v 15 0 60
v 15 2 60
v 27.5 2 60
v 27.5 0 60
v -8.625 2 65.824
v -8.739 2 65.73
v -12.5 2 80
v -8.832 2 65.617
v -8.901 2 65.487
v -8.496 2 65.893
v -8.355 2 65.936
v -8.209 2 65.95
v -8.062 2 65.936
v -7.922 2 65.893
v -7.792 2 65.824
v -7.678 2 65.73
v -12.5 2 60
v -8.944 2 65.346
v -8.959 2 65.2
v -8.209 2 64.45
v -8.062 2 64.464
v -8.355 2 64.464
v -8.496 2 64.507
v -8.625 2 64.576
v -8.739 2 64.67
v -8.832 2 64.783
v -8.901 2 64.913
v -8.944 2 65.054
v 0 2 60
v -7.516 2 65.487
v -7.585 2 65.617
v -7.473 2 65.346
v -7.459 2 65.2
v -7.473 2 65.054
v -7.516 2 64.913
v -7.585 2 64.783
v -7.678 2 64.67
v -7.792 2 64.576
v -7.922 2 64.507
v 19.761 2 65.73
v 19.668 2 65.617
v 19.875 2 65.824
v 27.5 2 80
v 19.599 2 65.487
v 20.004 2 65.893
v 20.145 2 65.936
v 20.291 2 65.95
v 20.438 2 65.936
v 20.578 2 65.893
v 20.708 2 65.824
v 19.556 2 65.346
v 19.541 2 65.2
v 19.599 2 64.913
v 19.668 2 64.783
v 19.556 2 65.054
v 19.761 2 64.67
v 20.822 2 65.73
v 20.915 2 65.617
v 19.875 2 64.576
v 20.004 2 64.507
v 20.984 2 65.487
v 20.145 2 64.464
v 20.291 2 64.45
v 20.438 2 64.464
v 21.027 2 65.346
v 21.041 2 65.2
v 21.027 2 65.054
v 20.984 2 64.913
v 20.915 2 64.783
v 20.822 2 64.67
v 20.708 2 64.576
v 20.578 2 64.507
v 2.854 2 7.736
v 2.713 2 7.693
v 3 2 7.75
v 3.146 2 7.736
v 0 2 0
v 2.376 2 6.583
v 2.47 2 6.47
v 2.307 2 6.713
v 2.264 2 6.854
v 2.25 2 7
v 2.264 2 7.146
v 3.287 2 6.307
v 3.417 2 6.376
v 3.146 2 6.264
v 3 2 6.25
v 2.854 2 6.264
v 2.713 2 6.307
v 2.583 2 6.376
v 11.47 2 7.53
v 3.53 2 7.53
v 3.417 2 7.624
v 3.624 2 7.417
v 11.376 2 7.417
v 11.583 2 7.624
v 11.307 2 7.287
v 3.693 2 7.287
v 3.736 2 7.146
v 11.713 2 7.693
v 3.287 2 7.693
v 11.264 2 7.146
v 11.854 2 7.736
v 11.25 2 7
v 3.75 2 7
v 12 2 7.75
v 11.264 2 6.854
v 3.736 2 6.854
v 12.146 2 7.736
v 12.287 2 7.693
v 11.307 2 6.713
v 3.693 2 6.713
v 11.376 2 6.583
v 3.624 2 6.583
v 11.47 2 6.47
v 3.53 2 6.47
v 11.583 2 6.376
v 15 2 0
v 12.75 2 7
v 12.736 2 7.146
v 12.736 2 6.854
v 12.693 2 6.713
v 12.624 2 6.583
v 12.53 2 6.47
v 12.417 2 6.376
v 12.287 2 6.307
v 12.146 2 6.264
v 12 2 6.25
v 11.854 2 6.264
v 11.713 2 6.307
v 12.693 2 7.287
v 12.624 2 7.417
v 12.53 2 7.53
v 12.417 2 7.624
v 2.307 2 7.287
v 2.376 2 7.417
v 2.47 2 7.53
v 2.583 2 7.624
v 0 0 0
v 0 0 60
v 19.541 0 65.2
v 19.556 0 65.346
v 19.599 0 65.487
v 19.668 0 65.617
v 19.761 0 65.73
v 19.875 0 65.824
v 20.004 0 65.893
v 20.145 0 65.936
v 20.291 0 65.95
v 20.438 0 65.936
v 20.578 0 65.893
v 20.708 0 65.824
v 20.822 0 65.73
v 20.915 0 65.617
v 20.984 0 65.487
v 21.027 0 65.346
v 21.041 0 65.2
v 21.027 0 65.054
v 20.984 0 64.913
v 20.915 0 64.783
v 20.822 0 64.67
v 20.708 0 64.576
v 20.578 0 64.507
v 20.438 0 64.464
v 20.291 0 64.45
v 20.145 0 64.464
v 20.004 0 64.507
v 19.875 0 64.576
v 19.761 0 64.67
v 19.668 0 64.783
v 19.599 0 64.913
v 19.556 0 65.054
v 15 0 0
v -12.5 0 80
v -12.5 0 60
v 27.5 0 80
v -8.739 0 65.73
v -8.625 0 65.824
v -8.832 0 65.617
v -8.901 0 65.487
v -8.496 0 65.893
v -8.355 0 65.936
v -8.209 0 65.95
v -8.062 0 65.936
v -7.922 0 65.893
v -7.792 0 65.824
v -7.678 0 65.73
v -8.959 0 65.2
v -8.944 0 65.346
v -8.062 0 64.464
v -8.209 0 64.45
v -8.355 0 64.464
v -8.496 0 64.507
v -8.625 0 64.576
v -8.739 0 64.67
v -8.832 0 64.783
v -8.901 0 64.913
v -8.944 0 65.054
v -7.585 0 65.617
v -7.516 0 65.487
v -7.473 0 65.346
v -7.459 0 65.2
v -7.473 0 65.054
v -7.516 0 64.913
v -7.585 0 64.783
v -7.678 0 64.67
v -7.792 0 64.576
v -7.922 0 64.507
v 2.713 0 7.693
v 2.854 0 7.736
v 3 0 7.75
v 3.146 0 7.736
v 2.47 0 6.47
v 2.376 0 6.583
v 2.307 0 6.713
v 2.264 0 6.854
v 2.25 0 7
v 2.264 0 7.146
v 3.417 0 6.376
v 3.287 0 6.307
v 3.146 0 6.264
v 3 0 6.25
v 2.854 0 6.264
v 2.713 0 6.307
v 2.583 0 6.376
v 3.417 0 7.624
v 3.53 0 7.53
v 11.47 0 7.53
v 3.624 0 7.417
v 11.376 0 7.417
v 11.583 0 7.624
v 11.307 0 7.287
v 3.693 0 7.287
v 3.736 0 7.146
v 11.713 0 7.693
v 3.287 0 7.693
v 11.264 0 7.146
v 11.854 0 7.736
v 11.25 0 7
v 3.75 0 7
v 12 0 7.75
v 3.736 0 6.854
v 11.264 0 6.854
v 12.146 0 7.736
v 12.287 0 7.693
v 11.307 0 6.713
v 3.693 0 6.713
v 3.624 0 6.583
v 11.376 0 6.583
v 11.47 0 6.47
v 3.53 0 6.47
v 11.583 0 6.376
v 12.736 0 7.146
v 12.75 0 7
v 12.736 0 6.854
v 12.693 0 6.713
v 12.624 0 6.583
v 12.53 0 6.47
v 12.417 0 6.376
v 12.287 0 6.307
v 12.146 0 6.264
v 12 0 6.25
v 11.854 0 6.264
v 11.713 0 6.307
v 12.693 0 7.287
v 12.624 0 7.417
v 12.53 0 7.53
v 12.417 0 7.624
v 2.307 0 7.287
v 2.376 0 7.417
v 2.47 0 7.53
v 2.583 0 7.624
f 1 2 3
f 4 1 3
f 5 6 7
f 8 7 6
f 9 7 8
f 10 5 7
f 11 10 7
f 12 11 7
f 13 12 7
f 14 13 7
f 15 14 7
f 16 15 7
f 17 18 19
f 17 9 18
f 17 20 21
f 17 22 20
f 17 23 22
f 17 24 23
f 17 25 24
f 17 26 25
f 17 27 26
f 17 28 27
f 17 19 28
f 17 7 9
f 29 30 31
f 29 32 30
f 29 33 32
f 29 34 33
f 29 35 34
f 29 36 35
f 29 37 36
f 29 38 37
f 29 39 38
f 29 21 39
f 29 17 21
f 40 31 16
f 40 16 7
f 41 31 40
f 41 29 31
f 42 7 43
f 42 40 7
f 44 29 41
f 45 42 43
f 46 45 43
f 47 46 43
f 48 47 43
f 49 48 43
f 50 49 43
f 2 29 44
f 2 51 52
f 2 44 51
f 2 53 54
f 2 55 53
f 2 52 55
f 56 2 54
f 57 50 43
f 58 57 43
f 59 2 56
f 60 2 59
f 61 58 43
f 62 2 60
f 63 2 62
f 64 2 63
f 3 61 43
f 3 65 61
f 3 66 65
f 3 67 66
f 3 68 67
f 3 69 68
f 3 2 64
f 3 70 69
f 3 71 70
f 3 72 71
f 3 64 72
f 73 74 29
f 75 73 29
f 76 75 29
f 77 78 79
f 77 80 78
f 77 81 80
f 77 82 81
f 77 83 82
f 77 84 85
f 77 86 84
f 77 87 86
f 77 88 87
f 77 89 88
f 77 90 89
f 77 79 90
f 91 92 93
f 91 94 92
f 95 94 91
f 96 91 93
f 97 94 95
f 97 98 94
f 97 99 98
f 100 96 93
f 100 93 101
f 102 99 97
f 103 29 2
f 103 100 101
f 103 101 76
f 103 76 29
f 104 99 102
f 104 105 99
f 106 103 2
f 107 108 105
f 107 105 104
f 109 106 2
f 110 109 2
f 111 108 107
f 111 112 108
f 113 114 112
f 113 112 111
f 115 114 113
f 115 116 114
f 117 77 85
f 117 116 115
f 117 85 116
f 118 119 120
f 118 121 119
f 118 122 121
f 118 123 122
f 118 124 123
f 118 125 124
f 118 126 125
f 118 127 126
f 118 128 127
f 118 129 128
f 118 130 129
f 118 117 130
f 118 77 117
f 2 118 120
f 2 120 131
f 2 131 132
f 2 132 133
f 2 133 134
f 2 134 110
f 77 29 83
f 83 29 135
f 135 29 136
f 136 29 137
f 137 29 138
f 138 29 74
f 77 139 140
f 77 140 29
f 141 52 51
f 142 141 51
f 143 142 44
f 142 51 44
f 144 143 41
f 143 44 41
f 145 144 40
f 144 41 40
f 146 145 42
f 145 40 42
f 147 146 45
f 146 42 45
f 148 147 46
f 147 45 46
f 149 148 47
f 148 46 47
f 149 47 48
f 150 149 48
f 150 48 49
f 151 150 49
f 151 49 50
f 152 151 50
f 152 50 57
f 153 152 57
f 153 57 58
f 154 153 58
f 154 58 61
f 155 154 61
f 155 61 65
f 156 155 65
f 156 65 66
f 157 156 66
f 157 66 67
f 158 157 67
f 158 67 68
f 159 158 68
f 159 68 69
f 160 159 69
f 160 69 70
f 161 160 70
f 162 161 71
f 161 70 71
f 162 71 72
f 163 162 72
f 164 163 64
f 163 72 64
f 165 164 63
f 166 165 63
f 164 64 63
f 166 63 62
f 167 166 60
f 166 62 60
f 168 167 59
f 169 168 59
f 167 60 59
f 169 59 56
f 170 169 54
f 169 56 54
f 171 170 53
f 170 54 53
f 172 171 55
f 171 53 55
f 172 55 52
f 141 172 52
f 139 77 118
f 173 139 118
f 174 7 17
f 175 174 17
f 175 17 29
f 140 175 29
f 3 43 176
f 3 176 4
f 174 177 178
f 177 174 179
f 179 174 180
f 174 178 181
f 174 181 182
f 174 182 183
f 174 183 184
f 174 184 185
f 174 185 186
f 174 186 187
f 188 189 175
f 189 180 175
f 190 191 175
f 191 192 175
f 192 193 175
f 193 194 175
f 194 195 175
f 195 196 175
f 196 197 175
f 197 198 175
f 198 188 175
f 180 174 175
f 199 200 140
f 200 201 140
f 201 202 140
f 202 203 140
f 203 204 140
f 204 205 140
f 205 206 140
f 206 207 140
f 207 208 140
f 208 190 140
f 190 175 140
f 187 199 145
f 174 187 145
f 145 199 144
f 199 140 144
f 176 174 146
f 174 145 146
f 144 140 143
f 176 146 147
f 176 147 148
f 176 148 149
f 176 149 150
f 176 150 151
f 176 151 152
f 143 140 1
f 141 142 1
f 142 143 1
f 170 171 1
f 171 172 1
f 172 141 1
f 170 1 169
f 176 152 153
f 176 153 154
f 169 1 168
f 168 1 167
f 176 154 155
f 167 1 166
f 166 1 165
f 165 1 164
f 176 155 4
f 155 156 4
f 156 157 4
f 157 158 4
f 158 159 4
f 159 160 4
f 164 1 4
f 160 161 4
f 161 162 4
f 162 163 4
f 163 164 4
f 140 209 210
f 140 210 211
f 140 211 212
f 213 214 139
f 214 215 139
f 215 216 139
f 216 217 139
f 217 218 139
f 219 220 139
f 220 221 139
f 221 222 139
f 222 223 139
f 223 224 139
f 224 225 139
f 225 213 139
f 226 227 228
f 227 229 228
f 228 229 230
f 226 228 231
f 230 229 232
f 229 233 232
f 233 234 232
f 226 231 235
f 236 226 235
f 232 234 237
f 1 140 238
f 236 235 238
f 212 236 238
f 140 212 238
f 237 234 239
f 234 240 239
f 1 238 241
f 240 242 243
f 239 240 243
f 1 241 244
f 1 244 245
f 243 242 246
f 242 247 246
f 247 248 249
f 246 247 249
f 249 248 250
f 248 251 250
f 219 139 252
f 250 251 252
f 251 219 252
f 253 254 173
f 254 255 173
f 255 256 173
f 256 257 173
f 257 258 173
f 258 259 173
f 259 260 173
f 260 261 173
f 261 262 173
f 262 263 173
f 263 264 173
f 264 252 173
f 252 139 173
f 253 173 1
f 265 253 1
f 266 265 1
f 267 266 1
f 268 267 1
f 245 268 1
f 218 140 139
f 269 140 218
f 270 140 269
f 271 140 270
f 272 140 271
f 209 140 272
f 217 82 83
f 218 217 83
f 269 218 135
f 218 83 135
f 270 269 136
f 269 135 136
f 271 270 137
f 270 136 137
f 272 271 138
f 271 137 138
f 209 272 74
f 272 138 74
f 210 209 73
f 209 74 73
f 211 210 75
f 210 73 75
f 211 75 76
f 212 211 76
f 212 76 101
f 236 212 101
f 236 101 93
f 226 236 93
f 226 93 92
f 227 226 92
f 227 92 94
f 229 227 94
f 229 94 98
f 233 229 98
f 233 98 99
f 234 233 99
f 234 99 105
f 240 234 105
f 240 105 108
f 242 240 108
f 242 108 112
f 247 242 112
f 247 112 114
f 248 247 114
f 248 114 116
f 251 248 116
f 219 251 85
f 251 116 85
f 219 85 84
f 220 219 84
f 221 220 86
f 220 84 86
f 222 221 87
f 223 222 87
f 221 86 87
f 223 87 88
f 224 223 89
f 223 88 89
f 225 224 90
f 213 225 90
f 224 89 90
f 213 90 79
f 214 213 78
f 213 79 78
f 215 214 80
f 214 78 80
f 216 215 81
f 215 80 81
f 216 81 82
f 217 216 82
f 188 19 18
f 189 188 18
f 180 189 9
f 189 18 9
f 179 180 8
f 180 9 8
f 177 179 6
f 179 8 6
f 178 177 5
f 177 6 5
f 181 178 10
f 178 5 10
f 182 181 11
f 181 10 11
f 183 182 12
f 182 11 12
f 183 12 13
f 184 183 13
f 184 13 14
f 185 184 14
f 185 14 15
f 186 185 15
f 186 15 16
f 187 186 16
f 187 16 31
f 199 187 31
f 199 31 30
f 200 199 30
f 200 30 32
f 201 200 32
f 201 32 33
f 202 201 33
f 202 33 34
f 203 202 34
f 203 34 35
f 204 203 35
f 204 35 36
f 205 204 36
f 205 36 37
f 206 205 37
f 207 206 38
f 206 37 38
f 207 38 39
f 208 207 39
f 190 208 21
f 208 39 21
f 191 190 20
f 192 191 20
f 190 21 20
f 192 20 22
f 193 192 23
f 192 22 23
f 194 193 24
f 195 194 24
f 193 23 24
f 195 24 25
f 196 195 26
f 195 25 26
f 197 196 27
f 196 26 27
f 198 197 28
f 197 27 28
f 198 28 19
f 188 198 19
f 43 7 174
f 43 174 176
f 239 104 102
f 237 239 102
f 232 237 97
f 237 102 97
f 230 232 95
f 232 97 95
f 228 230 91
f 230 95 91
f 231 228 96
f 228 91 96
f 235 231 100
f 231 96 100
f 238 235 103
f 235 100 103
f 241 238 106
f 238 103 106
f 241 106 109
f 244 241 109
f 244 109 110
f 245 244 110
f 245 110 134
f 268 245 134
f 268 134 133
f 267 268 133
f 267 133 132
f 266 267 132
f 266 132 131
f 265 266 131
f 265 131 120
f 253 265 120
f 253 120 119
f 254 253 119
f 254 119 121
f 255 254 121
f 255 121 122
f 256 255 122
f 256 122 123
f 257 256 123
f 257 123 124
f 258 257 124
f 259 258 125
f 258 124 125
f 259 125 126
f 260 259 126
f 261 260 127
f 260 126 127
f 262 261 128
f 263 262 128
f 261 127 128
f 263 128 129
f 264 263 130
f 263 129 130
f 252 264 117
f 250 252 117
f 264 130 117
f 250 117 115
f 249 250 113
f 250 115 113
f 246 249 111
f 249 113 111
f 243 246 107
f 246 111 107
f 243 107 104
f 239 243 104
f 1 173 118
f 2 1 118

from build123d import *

# Parameters (mm, degrees)
SKETCH1_W           = 15
SKETCH1_H           = 2
BOSS_EXTRUDE1_DEPTH = 80
SKETCH2_W           = 40
SKETCH2_H           = 20
BOSS_EXTRUDE2_DEPTH = 2
SKETCH3_R           = 0.75
CUT_EXTRUDE1_DEPTH  = 85.618260441


with BuildPart() as part:
    # Sketch1 → Boss-Extrude1 (new body)
    with BuildSketch(Plane.XY):
        with Locations((7.5, 1)):
            Rectangle(SKETCH1_W, SKETCH1_H)
    extrude(amount=BOSS_EXTRUDE1_DEPTH)

    # Sketch2 → Boss-Extrude2 (add)
    with BuildSketch(Plane(origin=(0, 2, 0), x_dir=(1, 0, 0), z_dir=(0, 1, 0))):
        with Locations((7.5, -70)):
            Rectangle(SKETCH2_W, SKETCH2_H)
    extrude(amount=-BOSS_EXTRUDE2_DEPTH)

    # Sketch3 → Cut-Extrude1 (cut, through all)
    with BuildSketch(Plane(origin=(0, 2, 0), x_dir=(1, 0, 0), z_dir=(0, 1, 0))):
        with Locations(Location((20.291432582, -65.2, 0), (0, 0, 180))):
            Circle(SKETCH3_R)
        with Locations(Location((-8.208567418, -65.2, 0), (0, 0, 180))):
            Circle(SKETCH3_R)
        with Locations(Location((12, -7, 0), (0, 0, 180))):
            Circle(SKETCH3_R)
        with Locations(Location((3, -7, 0), (0, 0, 180))):
            Circle(SKETCH3_R)
    extrude(amount=-CUT_EXTRUDE1_DEPTH, mode=Mode.SUBTRACT)


solid = part.part
